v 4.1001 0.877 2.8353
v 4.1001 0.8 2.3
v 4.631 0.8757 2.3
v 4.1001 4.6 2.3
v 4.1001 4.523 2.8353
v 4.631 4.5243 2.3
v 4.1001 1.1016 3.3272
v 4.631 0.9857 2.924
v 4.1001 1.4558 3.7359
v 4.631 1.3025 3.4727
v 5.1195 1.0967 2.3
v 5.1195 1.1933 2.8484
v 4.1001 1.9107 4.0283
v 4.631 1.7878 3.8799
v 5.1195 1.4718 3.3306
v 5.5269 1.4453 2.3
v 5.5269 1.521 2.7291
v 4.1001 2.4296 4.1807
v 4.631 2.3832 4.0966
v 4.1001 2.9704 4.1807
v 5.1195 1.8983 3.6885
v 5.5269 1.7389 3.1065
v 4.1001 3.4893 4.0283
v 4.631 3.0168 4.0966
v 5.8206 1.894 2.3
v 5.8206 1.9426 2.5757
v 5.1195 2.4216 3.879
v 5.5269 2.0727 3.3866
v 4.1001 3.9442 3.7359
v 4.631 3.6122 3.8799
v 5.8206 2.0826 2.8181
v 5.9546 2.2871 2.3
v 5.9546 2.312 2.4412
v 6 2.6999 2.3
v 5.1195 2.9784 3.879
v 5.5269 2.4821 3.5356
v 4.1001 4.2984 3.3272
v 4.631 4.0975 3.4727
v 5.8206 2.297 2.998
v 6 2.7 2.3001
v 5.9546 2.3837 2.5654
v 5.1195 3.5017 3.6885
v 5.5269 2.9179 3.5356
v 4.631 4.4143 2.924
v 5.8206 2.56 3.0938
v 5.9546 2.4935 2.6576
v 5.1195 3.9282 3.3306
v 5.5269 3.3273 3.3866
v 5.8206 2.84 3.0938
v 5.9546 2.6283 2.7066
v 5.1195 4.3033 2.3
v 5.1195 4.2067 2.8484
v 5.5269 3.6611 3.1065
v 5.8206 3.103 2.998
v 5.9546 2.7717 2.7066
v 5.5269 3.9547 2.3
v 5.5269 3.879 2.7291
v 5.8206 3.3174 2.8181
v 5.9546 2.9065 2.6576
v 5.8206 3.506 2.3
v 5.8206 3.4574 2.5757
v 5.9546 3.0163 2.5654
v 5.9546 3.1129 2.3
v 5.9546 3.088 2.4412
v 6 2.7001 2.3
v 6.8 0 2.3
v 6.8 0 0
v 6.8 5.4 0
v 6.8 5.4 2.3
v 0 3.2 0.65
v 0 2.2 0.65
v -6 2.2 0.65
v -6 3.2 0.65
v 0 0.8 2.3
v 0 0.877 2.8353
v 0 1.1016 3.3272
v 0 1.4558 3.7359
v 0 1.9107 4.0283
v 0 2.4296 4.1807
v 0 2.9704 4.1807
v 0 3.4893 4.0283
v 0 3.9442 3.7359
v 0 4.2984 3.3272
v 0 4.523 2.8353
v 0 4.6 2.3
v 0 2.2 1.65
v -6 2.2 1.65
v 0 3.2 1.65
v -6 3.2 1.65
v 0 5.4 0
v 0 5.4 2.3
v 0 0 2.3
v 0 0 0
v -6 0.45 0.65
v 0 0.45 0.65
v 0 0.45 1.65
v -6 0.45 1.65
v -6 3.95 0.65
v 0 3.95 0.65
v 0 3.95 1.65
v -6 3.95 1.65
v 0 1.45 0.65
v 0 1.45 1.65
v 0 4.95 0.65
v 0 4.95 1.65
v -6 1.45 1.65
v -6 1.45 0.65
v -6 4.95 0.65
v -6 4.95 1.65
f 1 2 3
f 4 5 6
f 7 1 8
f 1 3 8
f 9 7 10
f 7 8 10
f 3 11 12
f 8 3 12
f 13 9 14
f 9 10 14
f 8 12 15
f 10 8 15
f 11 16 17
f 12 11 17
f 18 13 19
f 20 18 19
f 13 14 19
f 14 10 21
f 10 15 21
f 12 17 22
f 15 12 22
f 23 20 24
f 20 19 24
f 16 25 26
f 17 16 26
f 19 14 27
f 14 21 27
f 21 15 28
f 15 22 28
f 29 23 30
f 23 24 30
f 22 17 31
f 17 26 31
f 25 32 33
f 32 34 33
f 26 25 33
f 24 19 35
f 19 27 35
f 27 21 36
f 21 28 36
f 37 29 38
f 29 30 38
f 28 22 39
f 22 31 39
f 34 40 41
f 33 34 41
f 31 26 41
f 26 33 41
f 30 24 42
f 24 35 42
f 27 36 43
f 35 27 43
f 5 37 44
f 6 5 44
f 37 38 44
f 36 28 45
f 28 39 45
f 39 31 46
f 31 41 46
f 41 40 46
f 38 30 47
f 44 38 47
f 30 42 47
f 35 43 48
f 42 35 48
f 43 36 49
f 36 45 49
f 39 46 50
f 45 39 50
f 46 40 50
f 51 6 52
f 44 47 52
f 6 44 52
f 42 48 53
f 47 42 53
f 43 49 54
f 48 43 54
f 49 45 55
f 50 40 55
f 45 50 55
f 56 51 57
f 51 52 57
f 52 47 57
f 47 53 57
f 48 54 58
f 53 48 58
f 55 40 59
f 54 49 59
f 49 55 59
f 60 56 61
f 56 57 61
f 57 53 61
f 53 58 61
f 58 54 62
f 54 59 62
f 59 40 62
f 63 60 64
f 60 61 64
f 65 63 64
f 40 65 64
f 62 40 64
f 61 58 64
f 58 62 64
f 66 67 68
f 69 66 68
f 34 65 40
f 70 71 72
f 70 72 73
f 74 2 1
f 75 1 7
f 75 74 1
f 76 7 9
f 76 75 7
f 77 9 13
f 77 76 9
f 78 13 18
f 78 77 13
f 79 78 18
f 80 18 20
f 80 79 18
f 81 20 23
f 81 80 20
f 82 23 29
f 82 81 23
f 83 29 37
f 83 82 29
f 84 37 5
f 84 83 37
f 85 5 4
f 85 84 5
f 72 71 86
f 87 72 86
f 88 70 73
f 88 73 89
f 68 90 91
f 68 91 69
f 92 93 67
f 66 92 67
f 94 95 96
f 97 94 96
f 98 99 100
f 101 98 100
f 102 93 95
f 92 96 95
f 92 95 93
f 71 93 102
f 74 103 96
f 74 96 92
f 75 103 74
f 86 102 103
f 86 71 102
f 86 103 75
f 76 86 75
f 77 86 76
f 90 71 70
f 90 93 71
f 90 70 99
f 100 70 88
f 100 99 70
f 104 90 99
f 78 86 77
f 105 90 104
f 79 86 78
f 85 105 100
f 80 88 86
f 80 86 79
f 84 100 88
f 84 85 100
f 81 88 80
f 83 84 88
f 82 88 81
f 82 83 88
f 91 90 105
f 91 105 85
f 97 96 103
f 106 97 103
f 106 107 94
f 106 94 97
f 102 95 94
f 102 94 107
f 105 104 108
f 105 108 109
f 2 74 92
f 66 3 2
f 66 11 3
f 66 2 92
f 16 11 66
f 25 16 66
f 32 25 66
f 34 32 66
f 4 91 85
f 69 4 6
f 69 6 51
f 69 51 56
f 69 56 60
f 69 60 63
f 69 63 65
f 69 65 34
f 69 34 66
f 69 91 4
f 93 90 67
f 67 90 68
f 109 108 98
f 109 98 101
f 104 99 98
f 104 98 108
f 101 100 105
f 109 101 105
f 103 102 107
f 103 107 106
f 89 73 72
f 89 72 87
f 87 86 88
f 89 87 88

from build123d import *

# Parameters (mm, degrees)
ESQUISSE1_W        = 6.8
ESQUISSE1_H        = 5.4
BOSS_EXTRU_1_DEPTH = 2.3
ESQUISSE2_R        = 1.9
BOSS_EXTRU_2_DEPTH = 6
CONG_1_R           = 1.9
ESQUISSE3_W        = 1
ESQUISSE3_H        = 1
BOSS_EXTRU_3_DEPTH = 6


with BuildPart() as part:
    # Esquisse1 → Boss.-Extru.1 (new body)
    with BuildSketch(Plane.XY):
        with Locations((3.4, 2.7)):
            Rectangle(ESQUISSE1_W, ESQUISSE1_H)
    extrude(amount=BOSS_EXTRU_1_DEPTH)

    # Esquisse2 → Boss.-Extru.2 (add)
    with BuildSketch(Plane.ZY):
        with Locations((2.3, 2.7)):
            Circle(ESQUISSE2_R)
    extrude(amount=-BOSS_EXTRU_2_DEPTH)

    # Congé1
    cong_1_edges = [part.edges().sort_by_distance(p)[0] for p in [
        (6, 2.7, 4.2),
    ]]
    fillet(cong_1_edges, radius=CONG_1_R - 0.0001)  # a hair under: the kernel refuses the full size

    # Esquisse3 → Boss.-Extru.3 (add)
    with BuildSketch(Plane.ZY):
        with Locations((1.15, 4.45)):
            Rectangle(ESQUISSE3_W, ESQUISSE3_H)
        with Locations((1.15, 2.7)):
            Rectangle(ESQUISSE3_W, ESQUISSE3_H)
        with Locations((1.15, 0.95)):
            Rectangle(ESQUISSE3_W, ESQUISSE3_H)
    extrude(amount=BOSS_EXTRU_3_DEPTH)


solid = part.part
